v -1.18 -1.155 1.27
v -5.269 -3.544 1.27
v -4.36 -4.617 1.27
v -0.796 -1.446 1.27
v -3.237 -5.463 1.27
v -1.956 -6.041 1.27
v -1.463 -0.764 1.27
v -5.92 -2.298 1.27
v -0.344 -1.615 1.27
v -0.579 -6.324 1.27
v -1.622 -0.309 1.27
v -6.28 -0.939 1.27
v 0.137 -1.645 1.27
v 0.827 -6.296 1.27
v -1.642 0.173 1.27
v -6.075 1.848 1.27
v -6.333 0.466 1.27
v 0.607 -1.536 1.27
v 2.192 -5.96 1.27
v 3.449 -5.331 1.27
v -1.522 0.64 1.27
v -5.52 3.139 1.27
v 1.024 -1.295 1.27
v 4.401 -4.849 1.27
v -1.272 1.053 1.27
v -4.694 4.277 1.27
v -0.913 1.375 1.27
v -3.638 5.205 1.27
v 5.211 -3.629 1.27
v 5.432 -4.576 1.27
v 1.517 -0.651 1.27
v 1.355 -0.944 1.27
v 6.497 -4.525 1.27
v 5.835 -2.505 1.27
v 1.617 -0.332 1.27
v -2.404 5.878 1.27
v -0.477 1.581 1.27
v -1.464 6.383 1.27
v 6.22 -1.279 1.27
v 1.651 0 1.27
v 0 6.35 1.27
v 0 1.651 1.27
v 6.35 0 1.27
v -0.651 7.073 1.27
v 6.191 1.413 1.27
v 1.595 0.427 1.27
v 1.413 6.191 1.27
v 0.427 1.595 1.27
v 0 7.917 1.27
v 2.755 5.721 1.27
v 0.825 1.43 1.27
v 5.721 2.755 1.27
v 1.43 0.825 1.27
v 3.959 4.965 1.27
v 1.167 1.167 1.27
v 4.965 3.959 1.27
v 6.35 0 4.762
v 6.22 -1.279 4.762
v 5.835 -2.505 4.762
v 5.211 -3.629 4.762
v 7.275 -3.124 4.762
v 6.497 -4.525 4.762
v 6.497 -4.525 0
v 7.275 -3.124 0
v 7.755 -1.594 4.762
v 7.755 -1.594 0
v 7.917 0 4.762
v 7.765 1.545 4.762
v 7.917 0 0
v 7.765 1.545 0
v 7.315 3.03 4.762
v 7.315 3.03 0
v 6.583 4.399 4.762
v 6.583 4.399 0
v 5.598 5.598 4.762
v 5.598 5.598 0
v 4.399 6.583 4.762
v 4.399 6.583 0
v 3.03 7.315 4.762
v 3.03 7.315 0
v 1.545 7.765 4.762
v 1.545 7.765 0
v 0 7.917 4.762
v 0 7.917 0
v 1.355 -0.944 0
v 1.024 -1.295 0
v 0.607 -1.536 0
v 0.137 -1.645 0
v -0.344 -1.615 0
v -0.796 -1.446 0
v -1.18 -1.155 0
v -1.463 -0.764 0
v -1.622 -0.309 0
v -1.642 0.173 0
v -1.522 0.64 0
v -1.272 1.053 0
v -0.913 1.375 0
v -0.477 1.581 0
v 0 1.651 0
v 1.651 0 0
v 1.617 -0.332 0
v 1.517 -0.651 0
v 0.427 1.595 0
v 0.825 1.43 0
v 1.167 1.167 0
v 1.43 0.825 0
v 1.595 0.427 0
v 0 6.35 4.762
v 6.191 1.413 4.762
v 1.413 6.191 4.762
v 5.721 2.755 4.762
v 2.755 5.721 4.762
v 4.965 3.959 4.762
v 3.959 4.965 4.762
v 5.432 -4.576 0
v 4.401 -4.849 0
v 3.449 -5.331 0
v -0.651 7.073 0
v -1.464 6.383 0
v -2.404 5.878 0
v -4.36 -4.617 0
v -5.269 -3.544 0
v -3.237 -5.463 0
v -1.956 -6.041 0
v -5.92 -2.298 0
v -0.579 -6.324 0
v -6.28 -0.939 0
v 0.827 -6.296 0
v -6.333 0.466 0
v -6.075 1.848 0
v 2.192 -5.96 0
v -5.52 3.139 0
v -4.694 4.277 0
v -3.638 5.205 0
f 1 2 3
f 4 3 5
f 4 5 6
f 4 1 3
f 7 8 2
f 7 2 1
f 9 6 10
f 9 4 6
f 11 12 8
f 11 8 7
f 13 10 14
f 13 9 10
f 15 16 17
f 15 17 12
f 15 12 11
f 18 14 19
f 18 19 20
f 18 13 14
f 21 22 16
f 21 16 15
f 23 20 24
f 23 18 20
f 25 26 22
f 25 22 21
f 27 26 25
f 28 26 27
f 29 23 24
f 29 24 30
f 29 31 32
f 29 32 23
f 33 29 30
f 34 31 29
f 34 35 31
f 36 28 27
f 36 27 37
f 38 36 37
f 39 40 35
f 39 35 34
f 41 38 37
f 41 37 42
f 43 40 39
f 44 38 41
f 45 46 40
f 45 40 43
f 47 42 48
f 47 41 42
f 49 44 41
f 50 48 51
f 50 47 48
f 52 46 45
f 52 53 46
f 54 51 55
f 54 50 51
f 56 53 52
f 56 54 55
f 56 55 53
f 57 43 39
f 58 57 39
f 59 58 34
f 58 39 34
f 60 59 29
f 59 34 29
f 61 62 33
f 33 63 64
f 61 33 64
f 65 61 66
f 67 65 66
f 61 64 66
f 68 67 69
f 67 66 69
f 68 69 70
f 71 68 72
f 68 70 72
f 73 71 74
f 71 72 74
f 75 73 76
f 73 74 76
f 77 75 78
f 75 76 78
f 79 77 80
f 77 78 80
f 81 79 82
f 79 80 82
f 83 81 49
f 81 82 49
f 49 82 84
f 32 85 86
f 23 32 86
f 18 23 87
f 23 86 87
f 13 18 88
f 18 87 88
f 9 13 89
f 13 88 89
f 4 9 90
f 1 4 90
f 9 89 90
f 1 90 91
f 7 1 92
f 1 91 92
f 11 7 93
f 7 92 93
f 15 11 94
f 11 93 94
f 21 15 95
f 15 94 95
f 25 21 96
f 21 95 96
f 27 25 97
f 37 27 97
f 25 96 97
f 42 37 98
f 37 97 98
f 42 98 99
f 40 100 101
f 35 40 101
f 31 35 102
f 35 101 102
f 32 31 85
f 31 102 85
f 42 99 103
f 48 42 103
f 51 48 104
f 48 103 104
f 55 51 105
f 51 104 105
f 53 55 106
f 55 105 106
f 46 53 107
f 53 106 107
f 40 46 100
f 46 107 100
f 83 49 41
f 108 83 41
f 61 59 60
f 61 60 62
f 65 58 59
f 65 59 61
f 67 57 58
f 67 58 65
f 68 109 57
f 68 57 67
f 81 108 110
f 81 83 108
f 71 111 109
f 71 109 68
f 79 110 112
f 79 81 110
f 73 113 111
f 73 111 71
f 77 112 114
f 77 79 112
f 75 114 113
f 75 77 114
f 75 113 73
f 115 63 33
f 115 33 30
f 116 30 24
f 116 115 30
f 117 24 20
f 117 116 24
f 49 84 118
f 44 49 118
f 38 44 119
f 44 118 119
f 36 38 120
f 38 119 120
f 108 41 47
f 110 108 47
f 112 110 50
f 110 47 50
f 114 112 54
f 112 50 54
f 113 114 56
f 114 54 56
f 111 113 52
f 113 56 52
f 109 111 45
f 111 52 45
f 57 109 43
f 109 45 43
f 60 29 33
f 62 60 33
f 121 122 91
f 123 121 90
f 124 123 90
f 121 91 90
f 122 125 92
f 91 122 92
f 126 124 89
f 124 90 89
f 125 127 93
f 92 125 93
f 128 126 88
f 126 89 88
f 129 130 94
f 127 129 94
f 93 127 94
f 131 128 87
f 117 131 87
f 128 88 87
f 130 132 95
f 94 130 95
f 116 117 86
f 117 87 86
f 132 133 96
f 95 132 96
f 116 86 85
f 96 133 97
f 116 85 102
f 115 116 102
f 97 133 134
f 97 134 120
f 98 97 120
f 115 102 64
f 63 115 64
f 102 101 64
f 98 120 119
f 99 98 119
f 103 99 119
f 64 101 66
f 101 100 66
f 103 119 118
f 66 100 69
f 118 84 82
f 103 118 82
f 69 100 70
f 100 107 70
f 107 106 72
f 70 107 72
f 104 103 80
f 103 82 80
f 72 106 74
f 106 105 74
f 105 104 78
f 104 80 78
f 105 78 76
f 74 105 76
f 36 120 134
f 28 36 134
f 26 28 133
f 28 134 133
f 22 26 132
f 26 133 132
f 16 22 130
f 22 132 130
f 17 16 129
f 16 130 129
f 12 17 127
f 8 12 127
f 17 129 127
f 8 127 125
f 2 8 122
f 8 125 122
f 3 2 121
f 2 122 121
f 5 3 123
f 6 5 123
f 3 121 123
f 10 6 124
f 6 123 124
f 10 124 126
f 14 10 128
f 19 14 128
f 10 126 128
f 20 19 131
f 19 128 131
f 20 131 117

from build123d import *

# Parameters (mm, degrees)
F1_DEPTH    = 1.27
F2_DEPTH    = 4.7625
F3_T1_DEPTH = 1.27


# Not quite as in the source:
# - a fillet or chamfer that OpenCascade refuses, or shapes differently, is made with other operations: its cross-section is extruded or revolved along the edge and cut away or added
# - a feature names something its author has since deleted; it is built from what else it names


with BuildPart() as f1:
    # F0 (on Top) → F1 (new body)
    with BuildSketch(Plane.XY):
        with BuildLine():
            ThreePointArc((5.2108397025, -3.6290011842), (6.0585201209, -1.9017975562), (6.35, 0))
            ThreePointArc((6.35, 0), (4.4901280605, 4.4901280605), (0, 6.35))
            Line((0, 6.35), (0, 5.1572436072))
            ThreePointArc((0, 5.1572436072), (3.6467219269, 3.6467219269), (5.1572436072, 0))
            ThreePointArc((5.1572436072, 0), (4.9205140413, -1.5445721714), (4.2320582273, -2.9473453792))
            Line((4.2320582273, -2.9473453792), (5.2108397025, -3.6290011842))
        make_face()
        with BuildLine():
            ThreePointArc((0, 6.35), (4.4901280605, 4.4901280605), (6.35, 0))
            ThreePointArc((6.35, 0), (6.0585201209, -1.9017975562), (5.2108397025, -3.6290011842))
            Line((5.2108397025, -3.6290011842), (6.4969090936, -4.5246624615))
            ThreePointArc((6.4969090936, -4.5246624615), (7.5538025952, -2.3711736577), (7.9172216188, 0))
            ThreePointArc((7.9172216188, 0), (5.5983210948, 5.5983210948), (0, 7.9172216188))
            Line((0, 7.9172216188), (0, 6.35))
        make_face()
        with BuildLine():
            Line((0, 5.1572436072), (0, 6.35))
            ThreePointArc((0, 6.35), (-5.6287946099, -2.939246713), (5.2108397025, -3.6290011842))
            Line((5.2108397025, -3.6290011842), (4.2320582273, -2.9473453792))
            ThreePointArc((4.2320582273, -2.9473453792), (-4.571506302, -2.3871513891), (0, 5.1572436072))
        make_face()
        with BuildLine():
            Line((0, 1.651), (0, 5.1572436072))
            ThreePointArc((0, 5.1572436072), (-4.571506302, -2.3871513891), (4.2320582273, -2.9473453792))
            Line((4.2320582273, -2.9473453792), (1.3548183226, -0.9435403079))
            ThreePointArc((1.3548183226, -0.9435403079), (-1.4634865986, -0.7642041454), (0, 1.651))
        make_face()
        with BuildLine():
            ThreePointArc((5.1572436072, 0), (3.6467219269, 3.6467219269), (0, 5.1572436072))
            Line((0, 5.1572436072), (0, 1.651))
            ThreePointArc((0, 1.651), (1.1674332957, 1.1674332957), (1.651, 0))
            ThreePointArc((1.651, 0), (1.5752152314, -0.4944673646), (1.3548183226, -0.9435403079))
            Line((1.3548183226, -0.9435403079), (4.2320582273, -2.9473453792))
            ThreePointArc((4.2320582273, -2.9473453792), (4.9205140413, -1.5445721714), (5.1572436072, 0))
        make_face()
    extrude(amount=F1_DEPTH)

    # F0 (on Top) → F2 (join)
    with BuildSketch(Plane.XY):
        with BuildLine():
            ThreePointArc((0, 6.35), (4.4901280605, 4.4901280605), (6.35, 0))
            ThreePointArc((6.35, 0), (6.0585201209, -1.9017975562), (5.2108397025, -3.6290011842))
            Line((5.2108397025, -3.6290011842), (6.4969090936, -4.5246624615))
            ThreePointArc((6.4969090936, -4.5246624615), (7.5538025952, -2.3711736577), (7.9172216188, 0))
            ThreePointArc((7.9172216188, 0), (5.5983210948, 5.5983210948), (0, 7.9172216188))
            Line((0, 7.9172216188), (0, 6.35))
        make_face()
    extrude(amount=F2_DEPTH)

    # F3: fillet of radius 5.08 on 2 edges, made by hand

    # F3_s2 → F3_t1 (join)
    with BuildSketch(Plane.XY):
        with BuildLine():
            ThreePointArc((0, 7.9172216188), (-1.0395816291, 6.7062044575), (-2.4036069424, 5.8775142421))
            ThreePointArc((-2.4036069424, 5.8775142421), (-1.2248029561, 6.2307590002), (0, 6.35))
            Line((0, 6.35), (0, 7.9172216188))
        make_face()
        with BuildLine():
            ThreePointArc((6.4969090936, -4.5246624615), (4.9090257444, -4.6856562433), (3.4494633266, -5.3313884456))
            ThreePointArc((3.4494633266, -5.3313884456), (4.4130196845, -4.5659344349), (5.2108397025, -3.6290011842))
            Line((5.2108397025, -3.6290011842), (6.4969090936, -4.5246624615))
        make_face()
    extrude(amount=F3_T1_DEPTH)


solid = f1.part
